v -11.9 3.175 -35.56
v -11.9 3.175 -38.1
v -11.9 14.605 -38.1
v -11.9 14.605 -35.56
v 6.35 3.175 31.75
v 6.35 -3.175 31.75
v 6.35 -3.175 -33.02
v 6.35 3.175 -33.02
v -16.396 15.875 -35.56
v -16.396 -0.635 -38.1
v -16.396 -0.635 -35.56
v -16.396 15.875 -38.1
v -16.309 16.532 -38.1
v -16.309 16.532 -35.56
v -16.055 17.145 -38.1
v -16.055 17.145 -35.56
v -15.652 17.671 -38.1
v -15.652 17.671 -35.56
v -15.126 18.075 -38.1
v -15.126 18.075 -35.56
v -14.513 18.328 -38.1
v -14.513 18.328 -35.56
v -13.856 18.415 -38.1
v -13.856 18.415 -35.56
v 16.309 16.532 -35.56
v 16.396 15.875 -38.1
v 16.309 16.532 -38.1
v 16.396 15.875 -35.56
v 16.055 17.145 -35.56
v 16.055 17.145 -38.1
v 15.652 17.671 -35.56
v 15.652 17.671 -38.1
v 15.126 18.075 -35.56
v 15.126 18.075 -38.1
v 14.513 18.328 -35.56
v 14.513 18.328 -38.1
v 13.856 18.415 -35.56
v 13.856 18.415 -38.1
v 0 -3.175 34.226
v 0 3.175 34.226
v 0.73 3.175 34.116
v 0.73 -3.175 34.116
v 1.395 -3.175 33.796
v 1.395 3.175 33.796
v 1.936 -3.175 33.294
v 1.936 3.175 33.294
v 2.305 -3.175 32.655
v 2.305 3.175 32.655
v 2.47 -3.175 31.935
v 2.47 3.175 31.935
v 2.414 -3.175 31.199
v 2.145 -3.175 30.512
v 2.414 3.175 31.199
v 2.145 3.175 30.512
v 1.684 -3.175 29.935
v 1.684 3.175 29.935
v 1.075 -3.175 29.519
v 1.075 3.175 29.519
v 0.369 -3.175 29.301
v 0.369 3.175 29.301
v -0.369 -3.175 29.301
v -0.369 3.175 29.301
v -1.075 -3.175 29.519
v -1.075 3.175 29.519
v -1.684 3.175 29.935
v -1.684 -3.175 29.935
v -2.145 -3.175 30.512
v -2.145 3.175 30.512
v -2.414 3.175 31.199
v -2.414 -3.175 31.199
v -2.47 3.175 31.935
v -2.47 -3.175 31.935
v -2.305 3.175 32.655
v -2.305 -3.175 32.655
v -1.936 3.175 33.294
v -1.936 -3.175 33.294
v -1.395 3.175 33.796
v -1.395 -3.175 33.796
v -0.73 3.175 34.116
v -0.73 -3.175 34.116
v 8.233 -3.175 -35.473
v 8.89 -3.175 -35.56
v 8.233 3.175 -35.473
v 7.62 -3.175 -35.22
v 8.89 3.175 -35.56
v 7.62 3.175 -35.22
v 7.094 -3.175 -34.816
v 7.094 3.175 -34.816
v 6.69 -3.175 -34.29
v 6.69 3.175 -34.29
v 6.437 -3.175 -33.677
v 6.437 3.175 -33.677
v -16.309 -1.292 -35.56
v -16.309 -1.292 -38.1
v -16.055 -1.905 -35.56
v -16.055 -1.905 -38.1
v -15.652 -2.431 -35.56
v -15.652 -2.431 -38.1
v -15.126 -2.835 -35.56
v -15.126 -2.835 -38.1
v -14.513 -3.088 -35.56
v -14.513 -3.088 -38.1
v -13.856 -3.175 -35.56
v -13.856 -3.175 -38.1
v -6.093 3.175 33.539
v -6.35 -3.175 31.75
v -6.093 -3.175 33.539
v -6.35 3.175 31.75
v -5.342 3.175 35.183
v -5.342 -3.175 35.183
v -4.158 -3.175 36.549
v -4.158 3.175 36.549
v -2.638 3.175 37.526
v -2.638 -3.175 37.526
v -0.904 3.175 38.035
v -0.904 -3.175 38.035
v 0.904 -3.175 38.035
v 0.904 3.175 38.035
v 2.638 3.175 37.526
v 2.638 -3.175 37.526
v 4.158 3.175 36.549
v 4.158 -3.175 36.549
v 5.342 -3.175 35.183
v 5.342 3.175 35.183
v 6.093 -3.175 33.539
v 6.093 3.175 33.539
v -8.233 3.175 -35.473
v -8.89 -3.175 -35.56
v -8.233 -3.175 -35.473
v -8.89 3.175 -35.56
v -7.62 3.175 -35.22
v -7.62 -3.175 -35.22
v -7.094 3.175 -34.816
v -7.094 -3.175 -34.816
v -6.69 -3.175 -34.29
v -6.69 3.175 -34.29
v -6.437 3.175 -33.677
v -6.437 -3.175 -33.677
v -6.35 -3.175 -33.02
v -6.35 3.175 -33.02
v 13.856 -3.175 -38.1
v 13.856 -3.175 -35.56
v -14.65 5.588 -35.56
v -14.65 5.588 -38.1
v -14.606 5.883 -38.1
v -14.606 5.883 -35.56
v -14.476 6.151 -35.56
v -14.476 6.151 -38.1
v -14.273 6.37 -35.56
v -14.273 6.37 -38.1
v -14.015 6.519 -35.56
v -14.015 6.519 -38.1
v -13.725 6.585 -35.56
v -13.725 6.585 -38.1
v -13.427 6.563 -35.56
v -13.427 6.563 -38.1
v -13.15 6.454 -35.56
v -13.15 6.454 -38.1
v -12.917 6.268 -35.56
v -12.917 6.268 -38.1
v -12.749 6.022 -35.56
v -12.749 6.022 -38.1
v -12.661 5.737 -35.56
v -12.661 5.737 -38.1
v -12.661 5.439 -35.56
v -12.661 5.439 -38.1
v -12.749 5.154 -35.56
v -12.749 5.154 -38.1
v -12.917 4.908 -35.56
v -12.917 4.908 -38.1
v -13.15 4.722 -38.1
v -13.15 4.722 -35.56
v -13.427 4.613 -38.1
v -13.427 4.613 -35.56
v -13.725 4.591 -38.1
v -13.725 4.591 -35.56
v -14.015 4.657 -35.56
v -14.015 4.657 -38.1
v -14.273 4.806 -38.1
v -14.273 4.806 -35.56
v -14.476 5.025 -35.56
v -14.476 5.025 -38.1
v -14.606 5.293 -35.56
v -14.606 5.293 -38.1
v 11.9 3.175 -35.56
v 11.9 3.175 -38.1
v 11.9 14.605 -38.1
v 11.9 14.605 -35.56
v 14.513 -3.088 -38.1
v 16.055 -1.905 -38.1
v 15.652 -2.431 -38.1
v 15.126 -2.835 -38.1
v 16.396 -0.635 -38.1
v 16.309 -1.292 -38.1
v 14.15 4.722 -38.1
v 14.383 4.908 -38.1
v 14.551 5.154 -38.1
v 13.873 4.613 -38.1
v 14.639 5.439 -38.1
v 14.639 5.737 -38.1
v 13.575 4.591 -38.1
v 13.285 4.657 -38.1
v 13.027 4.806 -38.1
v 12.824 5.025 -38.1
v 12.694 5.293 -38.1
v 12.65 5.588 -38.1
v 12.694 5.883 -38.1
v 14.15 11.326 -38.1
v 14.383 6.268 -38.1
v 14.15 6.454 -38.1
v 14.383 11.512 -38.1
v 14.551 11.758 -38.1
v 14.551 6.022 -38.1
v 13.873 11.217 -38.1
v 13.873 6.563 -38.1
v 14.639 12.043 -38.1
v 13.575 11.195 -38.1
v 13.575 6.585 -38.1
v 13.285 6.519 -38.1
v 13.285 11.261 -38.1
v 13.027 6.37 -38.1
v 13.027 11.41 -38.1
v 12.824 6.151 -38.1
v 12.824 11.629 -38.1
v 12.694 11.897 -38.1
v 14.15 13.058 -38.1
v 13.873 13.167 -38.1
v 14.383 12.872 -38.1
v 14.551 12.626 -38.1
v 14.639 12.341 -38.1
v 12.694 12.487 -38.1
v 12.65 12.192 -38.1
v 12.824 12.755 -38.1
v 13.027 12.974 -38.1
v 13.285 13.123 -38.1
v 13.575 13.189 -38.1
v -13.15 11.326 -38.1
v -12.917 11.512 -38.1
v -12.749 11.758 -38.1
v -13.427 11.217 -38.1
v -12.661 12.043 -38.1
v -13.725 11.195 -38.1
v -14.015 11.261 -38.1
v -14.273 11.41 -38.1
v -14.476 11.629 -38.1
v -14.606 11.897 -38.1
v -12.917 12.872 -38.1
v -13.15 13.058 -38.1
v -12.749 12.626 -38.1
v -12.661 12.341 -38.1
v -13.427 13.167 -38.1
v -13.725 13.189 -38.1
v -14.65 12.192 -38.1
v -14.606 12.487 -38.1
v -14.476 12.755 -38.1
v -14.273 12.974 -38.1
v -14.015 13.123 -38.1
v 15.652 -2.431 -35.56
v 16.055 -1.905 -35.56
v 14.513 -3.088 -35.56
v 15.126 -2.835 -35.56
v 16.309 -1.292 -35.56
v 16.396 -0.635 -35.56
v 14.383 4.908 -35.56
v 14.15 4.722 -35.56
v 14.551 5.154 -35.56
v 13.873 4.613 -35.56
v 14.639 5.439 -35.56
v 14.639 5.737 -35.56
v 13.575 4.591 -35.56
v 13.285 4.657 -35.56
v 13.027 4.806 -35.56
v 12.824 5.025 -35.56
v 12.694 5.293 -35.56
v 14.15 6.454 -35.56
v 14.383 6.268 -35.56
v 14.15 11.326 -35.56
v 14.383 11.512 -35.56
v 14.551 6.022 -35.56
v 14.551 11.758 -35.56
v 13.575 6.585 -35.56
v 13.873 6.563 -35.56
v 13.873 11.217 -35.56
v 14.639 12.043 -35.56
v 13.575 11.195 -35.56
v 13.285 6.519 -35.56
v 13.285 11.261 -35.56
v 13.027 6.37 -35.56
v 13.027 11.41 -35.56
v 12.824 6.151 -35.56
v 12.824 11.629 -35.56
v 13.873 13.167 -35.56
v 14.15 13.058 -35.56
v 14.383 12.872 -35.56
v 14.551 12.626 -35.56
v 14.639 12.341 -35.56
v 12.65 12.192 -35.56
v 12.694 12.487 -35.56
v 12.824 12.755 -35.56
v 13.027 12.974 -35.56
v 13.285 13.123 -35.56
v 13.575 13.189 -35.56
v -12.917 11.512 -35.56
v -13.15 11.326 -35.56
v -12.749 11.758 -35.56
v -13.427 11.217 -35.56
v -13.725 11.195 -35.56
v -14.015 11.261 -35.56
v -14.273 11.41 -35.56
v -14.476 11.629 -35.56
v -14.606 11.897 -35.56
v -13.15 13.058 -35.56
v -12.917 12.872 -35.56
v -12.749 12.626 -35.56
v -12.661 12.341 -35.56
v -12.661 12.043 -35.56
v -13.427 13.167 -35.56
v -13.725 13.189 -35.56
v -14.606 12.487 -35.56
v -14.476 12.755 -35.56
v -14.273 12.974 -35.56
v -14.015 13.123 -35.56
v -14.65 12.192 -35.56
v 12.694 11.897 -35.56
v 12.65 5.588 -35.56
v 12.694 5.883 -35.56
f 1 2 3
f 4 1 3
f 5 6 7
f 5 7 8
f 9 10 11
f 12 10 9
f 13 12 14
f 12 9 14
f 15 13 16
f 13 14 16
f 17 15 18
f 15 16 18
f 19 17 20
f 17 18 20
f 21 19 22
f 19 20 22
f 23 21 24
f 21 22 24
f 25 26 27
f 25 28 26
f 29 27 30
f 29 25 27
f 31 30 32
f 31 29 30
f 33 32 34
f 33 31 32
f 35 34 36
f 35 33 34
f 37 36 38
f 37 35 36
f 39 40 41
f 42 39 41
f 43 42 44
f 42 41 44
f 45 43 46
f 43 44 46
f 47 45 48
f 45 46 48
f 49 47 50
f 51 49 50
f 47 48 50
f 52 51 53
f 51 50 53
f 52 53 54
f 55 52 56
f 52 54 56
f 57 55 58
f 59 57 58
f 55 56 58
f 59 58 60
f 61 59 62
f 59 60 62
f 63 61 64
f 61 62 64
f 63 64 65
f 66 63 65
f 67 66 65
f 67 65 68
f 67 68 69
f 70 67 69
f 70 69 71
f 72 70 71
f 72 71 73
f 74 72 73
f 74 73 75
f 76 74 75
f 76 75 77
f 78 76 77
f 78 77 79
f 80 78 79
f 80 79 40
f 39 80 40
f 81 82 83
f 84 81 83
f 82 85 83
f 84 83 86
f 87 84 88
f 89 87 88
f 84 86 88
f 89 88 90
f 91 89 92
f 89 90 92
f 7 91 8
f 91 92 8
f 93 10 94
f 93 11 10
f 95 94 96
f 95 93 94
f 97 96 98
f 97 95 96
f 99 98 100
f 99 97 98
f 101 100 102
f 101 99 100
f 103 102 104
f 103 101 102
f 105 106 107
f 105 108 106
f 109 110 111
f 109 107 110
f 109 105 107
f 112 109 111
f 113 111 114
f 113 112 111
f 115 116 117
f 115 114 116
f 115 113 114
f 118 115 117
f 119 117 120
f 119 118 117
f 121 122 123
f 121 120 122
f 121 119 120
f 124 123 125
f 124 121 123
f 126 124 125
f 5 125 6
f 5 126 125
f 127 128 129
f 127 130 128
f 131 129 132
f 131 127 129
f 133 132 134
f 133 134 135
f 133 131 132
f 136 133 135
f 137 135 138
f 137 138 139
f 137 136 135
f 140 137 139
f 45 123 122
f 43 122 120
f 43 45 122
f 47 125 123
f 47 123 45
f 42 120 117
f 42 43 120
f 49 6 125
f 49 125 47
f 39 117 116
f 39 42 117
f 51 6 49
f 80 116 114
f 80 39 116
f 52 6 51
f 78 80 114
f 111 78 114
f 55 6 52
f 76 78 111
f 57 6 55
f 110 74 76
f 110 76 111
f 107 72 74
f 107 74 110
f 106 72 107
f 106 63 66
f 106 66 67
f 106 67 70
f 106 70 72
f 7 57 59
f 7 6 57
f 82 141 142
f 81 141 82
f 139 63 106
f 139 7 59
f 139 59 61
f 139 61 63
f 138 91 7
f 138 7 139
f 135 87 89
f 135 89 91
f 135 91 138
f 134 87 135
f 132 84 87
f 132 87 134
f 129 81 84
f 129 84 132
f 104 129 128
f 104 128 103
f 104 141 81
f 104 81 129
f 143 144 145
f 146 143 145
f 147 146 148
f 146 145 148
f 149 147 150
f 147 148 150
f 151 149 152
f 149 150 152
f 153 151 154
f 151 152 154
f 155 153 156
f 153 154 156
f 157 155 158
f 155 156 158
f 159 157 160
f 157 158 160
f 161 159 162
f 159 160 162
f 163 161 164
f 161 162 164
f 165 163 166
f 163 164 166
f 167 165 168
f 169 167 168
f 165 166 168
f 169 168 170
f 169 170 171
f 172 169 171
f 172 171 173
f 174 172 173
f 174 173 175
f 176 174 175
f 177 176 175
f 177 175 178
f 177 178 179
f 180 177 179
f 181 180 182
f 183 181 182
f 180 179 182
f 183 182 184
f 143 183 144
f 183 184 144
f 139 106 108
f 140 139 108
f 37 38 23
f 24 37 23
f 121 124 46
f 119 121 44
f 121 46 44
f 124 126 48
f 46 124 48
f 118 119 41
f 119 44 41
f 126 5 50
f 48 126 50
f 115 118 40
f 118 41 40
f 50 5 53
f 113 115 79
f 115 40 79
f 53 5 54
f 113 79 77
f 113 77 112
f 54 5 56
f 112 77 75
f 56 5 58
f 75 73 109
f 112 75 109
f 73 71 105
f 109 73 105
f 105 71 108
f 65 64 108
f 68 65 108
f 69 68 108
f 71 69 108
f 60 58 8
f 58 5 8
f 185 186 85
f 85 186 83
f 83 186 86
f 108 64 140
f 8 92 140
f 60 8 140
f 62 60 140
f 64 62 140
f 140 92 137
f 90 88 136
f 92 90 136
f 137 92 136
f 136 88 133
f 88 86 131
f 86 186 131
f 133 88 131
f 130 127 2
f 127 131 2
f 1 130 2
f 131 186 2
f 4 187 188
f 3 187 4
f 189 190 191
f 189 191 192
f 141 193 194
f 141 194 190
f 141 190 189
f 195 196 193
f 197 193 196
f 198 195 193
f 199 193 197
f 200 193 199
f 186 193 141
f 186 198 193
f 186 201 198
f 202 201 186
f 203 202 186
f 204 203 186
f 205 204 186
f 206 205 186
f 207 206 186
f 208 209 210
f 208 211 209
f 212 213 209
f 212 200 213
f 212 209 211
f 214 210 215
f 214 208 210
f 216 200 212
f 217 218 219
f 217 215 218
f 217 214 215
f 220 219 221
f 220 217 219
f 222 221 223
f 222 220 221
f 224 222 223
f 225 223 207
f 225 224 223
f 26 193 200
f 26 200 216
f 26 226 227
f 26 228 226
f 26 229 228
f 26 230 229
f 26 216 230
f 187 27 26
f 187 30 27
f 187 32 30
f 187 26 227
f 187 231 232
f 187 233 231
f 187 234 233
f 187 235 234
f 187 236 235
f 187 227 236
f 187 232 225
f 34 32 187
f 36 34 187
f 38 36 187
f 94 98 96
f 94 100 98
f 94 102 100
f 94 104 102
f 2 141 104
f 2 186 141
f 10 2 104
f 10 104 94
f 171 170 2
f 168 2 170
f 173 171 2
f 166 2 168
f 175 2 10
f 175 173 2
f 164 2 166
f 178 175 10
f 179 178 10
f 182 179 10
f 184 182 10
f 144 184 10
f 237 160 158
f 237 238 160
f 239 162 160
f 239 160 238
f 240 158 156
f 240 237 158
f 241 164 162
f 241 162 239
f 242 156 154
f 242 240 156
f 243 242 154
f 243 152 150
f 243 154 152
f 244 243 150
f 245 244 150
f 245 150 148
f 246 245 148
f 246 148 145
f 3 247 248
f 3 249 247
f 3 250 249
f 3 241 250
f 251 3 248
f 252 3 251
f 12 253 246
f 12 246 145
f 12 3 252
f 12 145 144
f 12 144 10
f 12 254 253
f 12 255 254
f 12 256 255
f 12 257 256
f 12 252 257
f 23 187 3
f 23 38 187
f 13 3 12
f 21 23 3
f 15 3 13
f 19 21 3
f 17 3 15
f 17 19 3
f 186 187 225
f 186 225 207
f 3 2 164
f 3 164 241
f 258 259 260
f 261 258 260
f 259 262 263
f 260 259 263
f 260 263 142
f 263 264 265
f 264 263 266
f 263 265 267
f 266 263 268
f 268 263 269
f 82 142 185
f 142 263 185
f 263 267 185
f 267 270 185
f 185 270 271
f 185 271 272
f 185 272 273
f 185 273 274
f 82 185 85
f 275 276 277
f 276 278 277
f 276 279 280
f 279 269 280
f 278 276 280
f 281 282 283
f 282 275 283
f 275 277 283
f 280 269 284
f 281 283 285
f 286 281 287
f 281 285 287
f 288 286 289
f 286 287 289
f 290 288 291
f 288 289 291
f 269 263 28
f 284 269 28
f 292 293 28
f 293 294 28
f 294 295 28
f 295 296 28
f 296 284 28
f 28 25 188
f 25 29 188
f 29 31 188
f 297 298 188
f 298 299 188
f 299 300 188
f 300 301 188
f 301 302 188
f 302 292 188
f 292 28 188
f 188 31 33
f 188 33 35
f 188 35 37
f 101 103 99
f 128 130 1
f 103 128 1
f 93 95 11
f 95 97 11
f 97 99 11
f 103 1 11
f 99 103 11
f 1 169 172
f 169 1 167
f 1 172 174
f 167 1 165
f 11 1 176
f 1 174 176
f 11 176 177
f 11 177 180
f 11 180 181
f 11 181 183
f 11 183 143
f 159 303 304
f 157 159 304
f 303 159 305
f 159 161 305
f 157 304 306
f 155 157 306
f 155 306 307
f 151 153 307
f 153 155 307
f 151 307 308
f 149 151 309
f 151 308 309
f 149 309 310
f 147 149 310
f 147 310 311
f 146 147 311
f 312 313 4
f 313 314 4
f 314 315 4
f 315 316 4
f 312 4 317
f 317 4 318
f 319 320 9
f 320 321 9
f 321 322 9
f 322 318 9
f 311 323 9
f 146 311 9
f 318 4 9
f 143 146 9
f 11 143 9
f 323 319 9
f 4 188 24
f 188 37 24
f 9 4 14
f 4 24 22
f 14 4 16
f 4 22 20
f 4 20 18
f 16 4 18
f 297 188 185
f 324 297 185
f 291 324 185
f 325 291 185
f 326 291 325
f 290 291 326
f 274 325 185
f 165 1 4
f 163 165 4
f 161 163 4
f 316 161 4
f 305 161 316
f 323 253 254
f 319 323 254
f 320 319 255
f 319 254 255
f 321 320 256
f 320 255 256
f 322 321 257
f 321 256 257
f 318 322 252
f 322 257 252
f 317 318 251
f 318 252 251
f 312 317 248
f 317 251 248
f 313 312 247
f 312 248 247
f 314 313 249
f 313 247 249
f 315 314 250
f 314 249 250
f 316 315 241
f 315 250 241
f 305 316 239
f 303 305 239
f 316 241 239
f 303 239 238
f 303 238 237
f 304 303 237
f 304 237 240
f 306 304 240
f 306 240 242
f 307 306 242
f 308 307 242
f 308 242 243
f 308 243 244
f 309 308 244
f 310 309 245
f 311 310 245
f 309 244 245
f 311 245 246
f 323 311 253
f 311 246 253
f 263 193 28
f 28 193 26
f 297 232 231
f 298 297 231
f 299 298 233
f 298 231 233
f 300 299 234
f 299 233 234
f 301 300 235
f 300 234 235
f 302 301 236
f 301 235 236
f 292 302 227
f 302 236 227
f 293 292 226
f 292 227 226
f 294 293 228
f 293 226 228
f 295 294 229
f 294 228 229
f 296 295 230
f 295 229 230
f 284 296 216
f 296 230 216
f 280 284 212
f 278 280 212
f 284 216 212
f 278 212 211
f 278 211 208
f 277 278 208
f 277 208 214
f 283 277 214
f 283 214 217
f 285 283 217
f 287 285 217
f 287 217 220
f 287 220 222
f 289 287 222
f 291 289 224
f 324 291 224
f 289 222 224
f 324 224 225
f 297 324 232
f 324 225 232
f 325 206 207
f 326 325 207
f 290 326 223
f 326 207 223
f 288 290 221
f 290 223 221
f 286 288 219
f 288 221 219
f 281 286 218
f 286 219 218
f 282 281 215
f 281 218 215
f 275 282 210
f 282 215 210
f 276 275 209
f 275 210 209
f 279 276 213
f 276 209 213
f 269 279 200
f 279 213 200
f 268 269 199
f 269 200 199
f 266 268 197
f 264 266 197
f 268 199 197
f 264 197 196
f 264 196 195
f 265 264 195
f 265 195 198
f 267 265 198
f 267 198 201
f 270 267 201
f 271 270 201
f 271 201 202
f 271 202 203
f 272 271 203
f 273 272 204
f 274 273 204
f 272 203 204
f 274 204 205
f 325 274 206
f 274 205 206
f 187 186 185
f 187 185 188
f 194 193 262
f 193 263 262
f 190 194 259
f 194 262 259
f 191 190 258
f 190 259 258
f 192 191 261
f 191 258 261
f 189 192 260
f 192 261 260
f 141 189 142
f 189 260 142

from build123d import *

# Parameters (mm, degrees)
SKETCH1_W           = 12.7
SKETCH1_H           = 6.35
BOSS_EXTRUDE1_DEPTH = 38.1
CUT_EXTRUDE1_REACH  = 41.144
SKETCH2_R           = 2.4765
FILLET1_RADIUS      = 6.35
FILLET1_LENGTH      = 6.35
SKETCH3_W           = 32.7914
SKETCH3_H           = 21.59
SKETCH3_R           = 0.999998
SKETCH3_W_2         = 23.7998
SKETCH3_H_2         = 11.43
BOSS_EXTRUDE2_DEPTH = 2.54
FILLET3_R           = 2.54


with BuildPart() as part:
    # Sketch1 → Boss-Extrude1 (new, symmetric)
    with BuildSketch(Plane.XY):
        Rectangle(SKETCH1_W, SKETCH1_H)
    extrude(amount=BOSS_EXTRUDE1_DEPTH, both=True)

    # Sketch2 → Cut-Extrude1 (cut, up to next)
    with BuildSketch(Plane(origin=(0, 3.175, 0), x_dir=(1, 0, 0), z_dir=(0, 1, 0)), mode=Mode.PRIVATE) as cut_extrude1_sk1:
        with Locations(Location((0, -31.75, 0), (0, 0, 270))):
            Circle(SKETCH2_R)
    cut_extrude1_tool1 = extrude(cut_extrude1_sk1.sketch, amount=-CUT_EXTRUDE1_REACH, mode=Mode.PRIVATE) & part.part
    add(cut_extrude1_tool1.solids().sort_by_distance((0, 3.175, 31.75))[0], mode=Mode.SUBTRACT)

    # Fillet1: full round fillet: the end face becomes a half cylinder, R = half its width
    fillet1_face = Plane((0, 0, 38.1), x_dir=(0, 1, 0), z_dir=(0, 0, 1))  # on the end face: x along it, z out of the body
    fillet1_slab = fillet1_face.offset(-FILLET1_RADIUS / 2) * Box(FILLET1_LENGTH, 2 * FILLET1_RADIUS, FILLET1_RADIUS, mode=Mode.PRIVATE)  # the body's end, R deep
    fillet1_round = Plane((0, 0, 31.75), x_dir=(0, 0, 1), z_dir=(0, 1, 0)) * Cylinder(FILLET1_RADIUS, FILLET1_LENGTH, mode=Mode.PRIVATE)  # its axis R under the face
    add(fillet1_slab - fillet1_round, mode=Mode.SUBTRACT)

    # Sketch3 → Boss-Extrude2 (add)
    with BuildSketch(Plane(origin=(0, 0, -38.1), x_dir=(-1, 0, 0), z_dir=(0, 0, -1))):
        with Locations((0, 7.62)):
            Rectangle(SKETCH3_W, SKETCH3_H)
        with Locations((13.65, 5.588)):
            Circle(SKETCH3_R, mode=Mode.SUBTRACT)
        with Locations((13.65, 12.192)):
            Circle(SKETCH3_R, mode=Mode.SUBTRACT)
        with Locations((-13.65, 5.588)):
            Circle(SKETCH3_R, mode=Mode.SUBTRACT)
        with Locations((-13.65, 12.192)):
            Circle(SKETCH3_R, mode=Mode.SUBTRACT)
        with Locations((0, 8.89)):
            Rectangle(SKETCH3_W_2, SKETCH3_H_2, mode=Mode.SUBTRACT)
    extrude(amount=-BOSS_EXTRUDE2_DEPTH)

    # Fillet3
    fillet3_edges = [part.edges().sort_by_distance(p)[0] for p in [
        (-6.35, 0, -35.56),
        (6.35, 0, -35.56),
        (-16.3957, -3.175, -36.83),
        (16.3957, -3.175, -36.83),
        (16.3957, 18.415, -36.83),
        (-16.3957, 18.415, -36.83),
    ]]
    fillet(fillet3_edges, radius=FILLET3_R)


solid = part.part
